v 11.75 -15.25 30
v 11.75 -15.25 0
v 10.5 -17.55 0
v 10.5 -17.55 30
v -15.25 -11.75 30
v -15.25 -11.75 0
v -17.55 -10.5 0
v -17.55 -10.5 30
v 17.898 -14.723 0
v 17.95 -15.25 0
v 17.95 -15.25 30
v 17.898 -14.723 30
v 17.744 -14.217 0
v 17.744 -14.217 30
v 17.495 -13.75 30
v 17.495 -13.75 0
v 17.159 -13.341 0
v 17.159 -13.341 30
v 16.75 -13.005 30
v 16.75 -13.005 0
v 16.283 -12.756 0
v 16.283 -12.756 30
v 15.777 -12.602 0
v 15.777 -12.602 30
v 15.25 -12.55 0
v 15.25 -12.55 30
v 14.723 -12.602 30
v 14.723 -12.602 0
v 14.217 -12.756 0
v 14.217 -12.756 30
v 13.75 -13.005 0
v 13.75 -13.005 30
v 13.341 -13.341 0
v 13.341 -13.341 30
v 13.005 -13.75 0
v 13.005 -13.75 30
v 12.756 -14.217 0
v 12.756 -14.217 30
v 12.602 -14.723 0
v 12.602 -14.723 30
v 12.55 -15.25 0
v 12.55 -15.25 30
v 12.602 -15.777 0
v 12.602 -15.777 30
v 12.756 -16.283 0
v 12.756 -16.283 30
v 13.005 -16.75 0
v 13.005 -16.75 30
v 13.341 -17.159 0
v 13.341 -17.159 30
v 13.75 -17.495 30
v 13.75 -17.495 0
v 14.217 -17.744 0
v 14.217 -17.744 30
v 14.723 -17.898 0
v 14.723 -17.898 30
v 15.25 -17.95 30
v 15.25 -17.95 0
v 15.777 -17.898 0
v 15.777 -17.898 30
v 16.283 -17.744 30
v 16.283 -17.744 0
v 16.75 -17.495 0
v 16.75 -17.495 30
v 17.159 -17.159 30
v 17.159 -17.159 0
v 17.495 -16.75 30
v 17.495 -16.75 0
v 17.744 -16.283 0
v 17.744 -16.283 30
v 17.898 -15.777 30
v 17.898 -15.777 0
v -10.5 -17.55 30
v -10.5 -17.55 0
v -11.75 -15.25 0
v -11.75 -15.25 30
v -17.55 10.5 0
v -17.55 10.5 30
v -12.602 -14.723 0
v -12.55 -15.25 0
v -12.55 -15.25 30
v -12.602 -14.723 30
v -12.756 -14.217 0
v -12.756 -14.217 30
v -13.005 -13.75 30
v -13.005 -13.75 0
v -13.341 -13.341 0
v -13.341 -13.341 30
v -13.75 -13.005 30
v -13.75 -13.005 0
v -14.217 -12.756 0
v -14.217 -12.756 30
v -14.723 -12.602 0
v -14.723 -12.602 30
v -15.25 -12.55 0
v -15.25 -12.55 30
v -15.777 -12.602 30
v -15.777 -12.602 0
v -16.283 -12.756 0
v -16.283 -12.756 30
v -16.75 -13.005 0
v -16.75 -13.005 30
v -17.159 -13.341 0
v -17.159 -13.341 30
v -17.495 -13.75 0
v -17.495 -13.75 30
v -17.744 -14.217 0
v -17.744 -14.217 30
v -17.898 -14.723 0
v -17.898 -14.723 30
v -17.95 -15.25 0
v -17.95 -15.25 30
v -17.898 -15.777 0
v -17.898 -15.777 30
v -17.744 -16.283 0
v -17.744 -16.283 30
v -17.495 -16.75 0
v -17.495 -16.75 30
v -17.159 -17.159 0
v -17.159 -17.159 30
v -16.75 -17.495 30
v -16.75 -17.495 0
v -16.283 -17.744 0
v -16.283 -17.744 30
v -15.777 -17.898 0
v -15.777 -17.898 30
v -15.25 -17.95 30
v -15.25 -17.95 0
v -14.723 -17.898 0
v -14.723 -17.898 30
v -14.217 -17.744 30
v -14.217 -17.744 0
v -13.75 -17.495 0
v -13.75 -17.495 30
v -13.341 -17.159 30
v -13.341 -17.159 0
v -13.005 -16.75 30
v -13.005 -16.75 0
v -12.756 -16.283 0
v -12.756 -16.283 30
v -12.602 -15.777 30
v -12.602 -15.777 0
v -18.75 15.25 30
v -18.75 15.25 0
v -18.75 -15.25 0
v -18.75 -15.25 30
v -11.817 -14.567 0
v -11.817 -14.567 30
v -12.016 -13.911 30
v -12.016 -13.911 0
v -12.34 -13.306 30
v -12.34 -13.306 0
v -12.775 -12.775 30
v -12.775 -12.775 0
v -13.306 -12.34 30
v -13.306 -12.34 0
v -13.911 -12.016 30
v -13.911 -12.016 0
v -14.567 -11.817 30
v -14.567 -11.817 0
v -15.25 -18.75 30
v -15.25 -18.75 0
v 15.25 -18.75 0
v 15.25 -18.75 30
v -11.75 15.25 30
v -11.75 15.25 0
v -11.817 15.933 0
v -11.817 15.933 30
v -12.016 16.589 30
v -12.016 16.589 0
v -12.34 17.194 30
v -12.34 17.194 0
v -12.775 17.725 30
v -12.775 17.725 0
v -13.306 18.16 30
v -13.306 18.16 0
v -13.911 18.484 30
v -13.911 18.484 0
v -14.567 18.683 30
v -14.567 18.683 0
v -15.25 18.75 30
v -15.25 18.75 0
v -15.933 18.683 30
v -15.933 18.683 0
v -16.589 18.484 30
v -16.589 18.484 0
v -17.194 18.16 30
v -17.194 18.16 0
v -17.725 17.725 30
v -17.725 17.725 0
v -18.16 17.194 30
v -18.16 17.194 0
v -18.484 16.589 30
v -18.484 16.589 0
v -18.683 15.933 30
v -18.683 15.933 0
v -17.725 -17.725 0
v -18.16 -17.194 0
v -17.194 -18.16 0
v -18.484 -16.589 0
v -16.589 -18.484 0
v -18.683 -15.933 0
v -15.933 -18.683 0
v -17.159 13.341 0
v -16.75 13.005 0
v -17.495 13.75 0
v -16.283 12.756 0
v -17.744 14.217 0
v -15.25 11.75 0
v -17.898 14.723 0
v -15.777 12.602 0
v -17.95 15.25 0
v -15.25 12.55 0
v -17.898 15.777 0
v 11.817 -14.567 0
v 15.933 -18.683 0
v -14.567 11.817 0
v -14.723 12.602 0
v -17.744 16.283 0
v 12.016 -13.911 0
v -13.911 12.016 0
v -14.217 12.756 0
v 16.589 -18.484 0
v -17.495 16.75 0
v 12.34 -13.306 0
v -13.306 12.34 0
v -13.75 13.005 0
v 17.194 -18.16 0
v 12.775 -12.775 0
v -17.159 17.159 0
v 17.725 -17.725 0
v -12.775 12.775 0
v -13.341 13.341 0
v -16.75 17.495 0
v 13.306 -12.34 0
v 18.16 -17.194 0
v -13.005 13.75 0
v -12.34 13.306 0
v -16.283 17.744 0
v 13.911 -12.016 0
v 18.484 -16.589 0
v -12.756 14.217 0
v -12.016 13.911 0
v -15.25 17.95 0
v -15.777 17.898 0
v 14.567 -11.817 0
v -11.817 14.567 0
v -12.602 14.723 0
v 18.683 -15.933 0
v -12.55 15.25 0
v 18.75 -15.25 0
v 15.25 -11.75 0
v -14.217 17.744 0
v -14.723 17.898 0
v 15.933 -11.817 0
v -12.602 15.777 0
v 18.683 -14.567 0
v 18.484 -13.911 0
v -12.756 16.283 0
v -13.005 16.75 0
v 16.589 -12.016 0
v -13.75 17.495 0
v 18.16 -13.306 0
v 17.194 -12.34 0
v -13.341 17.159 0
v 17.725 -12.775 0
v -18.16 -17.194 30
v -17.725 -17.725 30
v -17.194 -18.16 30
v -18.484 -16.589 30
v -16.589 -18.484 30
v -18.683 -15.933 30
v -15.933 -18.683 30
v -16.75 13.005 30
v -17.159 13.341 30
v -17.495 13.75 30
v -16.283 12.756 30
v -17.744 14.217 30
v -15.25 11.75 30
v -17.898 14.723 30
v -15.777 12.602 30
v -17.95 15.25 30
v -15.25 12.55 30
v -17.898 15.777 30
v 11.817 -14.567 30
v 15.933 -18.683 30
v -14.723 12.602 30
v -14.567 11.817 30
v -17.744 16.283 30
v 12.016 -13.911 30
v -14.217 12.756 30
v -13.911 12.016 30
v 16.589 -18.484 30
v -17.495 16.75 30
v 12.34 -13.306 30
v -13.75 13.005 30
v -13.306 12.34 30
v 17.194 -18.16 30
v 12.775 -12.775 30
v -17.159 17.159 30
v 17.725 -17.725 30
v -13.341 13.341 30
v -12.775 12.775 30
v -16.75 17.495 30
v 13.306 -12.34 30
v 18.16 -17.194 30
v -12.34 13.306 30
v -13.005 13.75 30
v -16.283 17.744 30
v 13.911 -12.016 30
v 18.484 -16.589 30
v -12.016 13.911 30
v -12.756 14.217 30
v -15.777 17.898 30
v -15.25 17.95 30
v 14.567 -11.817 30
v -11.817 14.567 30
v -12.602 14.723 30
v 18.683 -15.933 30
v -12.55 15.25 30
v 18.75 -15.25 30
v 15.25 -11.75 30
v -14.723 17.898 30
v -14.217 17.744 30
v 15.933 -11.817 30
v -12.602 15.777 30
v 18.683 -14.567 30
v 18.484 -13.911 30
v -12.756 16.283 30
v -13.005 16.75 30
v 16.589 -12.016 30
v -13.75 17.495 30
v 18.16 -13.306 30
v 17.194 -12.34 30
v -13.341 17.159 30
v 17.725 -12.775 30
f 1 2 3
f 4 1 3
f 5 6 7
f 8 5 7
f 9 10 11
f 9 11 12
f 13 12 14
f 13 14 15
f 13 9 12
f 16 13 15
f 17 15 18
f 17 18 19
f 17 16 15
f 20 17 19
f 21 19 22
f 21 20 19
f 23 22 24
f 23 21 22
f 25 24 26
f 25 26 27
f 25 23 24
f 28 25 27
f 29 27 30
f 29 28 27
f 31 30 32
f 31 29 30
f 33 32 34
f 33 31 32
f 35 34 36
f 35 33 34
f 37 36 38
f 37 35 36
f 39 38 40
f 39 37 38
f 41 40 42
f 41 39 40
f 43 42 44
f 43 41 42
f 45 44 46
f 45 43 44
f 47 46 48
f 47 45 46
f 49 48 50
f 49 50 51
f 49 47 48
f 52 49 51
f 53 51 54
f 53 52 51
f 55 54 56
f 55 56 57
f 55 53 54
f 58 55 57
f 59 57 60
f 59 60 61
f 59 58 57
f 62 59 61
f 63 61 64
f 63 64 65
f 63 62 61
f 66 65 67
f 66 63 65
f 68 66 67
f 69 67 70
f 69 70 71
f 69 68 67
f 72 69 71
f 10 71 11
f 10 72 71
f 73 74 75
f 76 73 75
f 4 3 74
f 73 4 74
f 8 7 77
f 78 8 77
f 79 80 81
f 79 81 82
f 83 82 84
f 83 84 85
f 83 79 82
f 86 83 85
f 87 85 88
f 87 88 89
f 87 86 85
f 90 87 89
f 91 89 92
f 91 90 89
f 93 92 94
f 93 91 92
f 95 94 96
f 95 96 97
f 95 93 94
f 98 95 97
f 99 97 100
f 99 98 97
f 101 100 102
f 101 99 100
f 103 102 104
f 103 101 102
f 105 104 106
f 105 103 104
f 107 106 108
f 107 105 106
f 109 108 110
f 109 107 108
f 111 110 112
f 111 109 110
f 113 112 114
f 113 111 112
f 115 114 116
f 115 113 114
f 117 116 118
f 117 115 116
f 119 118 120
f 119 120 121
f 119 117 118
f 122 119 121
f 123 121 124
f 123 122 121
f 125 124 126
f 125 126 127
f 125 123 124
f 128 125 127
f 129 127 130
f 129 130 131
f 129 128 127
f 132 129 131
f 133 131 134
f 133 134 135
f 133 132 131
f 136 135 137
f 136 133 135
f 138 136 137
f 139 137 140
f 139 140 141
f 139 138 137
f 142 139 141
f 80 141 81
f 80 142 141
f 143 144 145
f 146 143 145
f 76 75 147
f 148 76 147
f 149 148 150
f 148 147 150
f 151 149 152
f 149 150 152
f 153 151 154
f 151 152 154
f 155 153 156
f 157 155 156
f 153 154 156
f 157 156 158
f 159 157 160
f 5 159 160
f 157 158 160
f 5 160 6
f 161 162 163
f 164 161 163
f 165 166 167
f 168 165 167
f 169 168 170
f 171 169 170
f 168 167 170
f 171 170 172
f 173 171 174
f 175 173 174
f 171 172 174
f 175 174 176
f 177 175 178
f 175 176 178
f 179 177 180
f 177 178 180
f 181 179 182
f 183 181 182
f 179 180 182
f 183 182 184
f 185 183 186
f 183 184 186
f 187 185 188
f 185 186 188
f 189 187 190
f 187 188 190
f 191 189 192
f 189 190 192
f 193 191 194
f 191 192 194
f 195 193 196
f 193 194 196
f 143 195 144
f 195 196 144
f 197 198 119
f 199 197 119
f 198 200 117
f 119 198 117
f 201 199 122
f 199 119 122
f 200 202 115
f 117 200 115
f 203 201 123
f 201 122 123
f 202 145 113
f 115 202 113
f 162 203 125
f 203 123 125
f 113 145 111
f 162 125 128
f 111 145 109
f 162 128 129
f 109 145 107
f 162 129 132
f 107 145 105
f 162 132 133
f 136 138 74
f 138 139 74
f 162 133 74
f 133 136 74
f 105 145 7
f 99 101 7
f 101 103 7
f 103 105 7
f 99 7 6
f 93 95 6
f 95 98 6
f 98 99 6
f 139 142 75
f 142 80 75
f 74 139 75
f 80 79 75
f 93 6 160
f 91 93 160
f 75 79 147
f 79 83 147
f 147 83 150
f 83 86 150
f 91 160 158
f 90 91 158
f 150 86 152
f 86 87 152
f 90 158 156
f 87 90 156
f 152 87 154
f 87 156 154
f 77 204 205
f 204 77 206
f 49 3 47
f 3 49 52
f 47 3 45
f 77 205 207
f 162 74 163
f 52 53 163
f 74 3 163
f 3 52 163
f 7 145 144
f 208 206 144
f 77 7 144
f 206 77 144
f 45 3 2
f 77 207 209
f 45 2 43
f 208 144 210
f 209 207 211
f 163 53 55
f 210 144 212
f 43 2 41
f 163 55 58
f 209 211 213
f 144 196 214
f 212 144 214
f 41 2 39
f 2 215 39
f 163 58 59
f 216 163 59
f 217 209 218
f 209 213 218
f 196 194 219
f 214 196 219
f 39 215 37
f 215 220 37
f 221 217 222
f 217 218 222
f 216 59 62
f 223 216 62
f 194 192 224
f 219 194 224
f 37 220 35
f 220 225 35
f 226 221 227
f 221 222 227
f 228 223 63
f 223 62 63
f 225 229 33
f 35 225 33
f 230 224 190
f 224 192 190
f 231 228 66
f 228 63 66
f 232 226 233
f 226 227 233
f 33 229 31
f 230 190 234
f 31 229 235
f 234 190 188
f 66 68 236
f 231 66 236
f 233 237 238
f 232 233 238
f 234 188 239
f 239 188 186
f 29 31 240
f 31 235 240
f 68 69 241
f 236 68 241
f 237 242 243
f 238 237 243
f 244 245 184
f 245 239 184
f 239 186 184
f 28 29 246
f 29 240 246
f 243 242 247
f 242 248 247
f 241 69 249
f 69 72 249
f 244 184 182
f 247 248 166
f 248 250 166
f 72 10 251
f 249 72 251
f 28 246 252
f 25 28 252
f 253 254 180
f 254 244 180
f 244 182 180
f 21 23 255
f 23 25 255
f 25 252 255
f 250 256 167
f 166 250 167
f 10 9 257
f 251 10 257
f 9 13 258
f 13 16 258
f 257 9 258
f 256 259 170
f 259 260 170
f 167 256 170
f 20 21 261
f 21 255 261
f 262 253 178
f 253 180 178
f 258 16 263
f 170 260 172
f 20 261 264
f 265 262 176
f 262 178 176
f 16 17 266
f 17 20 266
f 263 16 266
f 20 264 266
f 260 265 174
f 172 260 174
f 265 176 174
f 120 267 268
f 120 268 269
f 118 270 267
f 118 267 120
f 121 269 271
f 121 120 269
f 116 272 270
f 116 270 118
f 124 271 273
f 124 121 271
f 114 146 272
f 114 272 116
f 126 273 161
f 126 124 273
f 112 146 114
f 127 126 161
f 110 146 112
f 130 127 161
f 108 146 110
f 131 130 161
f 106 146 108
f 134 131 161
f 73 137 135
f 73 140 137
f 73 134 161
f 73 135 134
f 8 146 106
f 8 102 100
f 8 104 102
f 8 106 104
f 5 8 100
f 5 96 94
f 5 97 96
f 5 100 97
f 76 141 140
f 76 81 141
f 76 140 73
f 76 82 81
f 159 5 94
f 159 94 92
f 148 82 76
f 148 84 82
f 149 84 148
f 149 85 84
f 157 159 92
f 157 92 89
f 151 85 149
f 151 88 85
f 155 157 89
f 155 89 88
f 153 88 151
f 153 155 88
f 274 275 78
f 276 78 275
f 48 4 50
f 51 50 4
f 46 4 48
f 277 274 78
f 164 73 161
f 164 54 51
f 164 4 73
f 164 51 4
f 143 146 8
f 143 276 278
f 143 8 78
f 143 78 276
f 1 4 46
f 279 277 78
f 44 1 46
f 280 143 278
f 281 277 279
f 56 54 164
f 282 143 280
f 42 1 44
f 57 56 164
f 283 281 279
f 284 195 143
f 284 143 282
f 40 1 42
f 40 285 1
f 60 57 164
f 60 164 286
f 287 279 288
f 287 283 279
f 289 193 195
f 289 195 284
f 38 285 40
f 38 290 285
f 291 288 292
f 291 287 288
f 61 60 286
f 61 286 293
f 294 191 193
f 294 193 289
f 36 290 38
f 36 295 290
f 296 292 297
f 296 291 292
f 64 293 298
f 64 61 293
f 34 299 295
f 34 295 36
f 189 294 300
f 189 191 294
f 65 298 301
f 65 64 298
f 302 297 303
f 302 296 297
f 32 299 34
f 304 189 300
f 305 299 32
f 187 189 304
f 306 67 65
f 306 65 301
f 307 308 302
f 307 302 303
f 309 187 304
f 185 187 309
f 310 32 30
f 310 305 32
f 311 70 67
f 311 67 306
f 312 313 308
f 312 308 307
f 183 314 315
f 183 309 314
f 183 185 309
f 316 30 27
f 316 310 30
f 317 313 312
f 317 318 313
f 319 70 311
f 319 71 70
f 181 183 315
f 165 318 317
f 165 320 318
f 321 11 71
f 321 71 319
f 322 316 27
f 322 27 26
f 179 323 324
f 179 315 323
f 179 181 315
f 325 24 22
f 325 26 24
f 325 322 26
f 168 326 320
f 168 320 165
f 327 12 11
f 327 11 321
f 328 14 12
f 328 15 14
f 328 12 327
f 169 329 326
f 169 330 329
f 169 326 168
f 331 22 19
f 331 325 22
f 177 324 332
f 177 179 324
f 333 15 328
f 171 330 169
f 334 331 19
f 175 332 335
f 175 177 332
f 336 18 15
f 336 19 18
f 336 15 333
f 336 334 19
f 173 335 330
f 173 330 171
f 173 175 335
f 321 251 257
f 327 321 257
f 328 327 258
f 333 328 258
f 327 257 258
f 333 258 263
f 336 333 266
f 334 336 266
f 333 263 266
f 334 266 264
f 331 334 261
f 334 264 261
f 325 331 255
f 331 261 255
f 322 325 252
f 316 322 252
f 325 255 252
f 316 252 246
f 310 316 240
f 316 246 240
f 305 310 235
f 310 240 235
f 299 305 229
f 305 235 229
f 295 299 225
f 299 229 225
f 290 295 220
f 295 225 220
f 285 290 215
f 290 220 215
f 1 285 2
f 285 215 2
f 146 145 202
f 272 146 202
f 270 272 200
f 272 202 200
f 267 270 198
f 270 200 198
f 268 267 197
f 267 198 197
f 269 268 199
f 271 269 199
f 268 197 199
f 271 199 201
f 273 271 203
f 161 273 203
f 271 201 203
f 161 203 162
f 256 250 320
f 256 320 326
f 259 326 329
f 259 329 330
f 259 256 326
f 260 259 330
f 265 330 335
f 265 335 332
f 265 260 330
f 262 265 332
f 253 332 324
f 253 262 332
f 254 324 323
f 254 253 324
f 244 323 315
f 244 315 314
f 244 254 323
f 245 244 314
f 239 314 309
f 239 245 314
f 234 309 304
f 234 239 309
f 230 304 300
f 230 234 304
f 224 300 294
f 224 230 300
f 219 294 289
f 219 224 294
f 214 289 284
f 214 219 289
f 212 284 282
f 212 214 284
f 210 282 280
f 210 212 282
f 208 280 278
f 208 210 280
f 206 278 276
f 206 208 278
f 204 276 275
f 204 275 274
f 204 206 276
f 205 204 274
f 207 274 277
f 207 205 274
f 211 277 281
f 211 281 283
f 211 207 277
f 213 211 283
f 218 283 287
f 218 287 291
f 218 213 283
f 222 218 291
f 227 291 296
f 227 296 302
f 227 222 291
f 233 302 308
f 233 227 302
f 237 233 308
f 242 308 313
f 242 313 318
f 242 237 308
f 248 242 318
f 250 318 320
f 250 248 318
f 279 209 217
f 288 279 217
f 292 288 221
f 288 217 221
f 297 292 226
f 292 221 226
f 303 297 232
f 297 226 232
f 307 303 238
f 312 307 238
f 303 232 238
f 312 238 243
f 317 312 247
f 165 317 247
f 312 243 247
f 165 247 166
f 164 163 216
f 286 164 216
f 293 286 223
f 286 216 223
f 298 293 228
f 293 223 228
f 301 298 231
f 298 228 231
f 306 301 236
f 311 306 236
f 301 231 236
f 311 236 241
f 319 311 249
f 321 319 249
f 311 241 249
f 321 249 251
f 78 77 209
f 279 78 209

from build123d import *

# Parameters (mm, degrees)
F0_R     = 2.7
F1_DEPTH = 30


with BuildPart() as f1:
    # F0 (on Top) → F1 (new body)
    with BuildSketch(Plane.XY):
        with BuildLine():
            ThreePointArc((-15.25, 11.75), (-12.775126, 12.775126), (-11.75, 15.25))
            ThreePointArc((-11.75, 15.25), (-15.25, 18.75), (-18.75, 15.25))
            ThreePointArc((-18.75, 15.25), (-18.435906, 13.800862), (-17.55, 12.611819))
            ThreePointArc((-17.55, 12.611819), (-16.478081, 11.972529), (-15.25, 11.75))
        make_face()
        with Locations((-15.25, 15.25)):
            Circle(F0_R, mode=Mode.SUBTRACT)
        with BuildLine():
            Line((-17.55, 10.5), (-15.25, 11.75))
            ThreePointArc((-15.25, 11.75), (-16.478081, 11.972529), (-17.55, 12.611819))
            Line((-17.55, 12.611819), (-17.55, 10.5))
        make_face()
        with BuildLine():
            ThreePointArc((-17.55, 12.611819), (-18.435906, 13.800862), (-18.75, 15.25))
            Line((-18.75, 15.25), (-18.75, -15.25))
            ThreePointArc((-18.75, -15.25), (-18.435906, -13.800862), (-17.55, -12.611819))
            Line((-17.55, -12.611819), (-17.55, -10.5))
            Line((-17.55, -10.5), (-17.55, 10.5))
            Line((-17.55, 10.5), (-17.55, 12.611819))
        make_face()
        with BuildLine():
            ThreePointArc((-17.55, -12.611819), (-18.435906, -13.800862), (-18.75, -15.25))
            ThreePointArc((-18.75, -15.25), (-17.724874, -17.724874), (-15.25, -18.75))
            ThreePointArc((-15.25, -18.75), (-13.800862, -18.435906), (-12.611819, -17.55))
            ThreePointArc((-12.611819, -17.55), (-11.972529, -16.478081), (-11.75, -15.25))
            ThreePointArc((-11.75, -15.25), (-12.775126, -12.775126), (-15.25, -11.75))
            ThreePointArc((-15.25, -11.75), (-16.478081, -11.972529), (-17.55, -12.611819))
        make_face()
        with Locations((-15.25, -15.25)):
            Circle(F0_R, mode=Mode.SUBTRACT)
        with BuildLine():
            Line((-17.55, -10.5), (-17.55, -12.611819))
            ThreePointArc((-17.55, -12.611819), (-16.478081, -11.972529), (-15.25, -11.75))
            Line((-15.25, -11.75), (-17.55, -10.5))
        make_face()
        with BuildLine():
            ThreePointArc((-11.75, -15.25), (-11.972529, -16.478081), (-12.611819, -17.55))
            Line((-12.611819, -17.55), (-10.5, -17.55))
            Line((-10.5, -17.55), (-11.75, -15.25))
        make_face()
        with BuildLine():
            ThreePointArc((-12.611819, -17.55), (-13.800862, -18.435906), (-15.25, -18.75))
            Line((-15.25, -18.75), (15.25, -18.75))
            ThreePointArc((15.25, -18.75), (13.800862, -18.435906), (12.611819, -17.55))
            Line((12.611819, -17.55), (10.5, -17.55))
            Line((10.5, -17.55), (-10.5, -17.55))
            Line((-10.5, -17.55), (-12.611819, -17.55))
        make_face()
        with BuildLine():
            Line((10.5, -17.55), (12.611819, -17.55))
            ThreePointArc((12.611819, -17.55), (11.972529, -16.478081), (11.75, -15.25))
            Line((11.75, -15.25), (10.5, -17.55))
        make_face()
        with BuildLine():
            ThreePointArc((12.611819, -17.55), (13.800862, -18.435906), (15.25, -18.75))
            ThreePointArc((15.25, -18.75), (17.724874, -17.724874), (18.75, -15.25))
            ThreePointArc((18.75, -15.25), (15.25, -11.75), (11.75, -15.25))
            ThreePointArc((11.75, -15.25), (11.972529, -16.478081), (12.611819, -17.55))
        make_face()
        with Locations((15.25, -15.25)):
            Circle(F0_R, mode=Mode.SUBTRACT)
    extrude(amount=F1_DEPTH)


solid = f1.part
